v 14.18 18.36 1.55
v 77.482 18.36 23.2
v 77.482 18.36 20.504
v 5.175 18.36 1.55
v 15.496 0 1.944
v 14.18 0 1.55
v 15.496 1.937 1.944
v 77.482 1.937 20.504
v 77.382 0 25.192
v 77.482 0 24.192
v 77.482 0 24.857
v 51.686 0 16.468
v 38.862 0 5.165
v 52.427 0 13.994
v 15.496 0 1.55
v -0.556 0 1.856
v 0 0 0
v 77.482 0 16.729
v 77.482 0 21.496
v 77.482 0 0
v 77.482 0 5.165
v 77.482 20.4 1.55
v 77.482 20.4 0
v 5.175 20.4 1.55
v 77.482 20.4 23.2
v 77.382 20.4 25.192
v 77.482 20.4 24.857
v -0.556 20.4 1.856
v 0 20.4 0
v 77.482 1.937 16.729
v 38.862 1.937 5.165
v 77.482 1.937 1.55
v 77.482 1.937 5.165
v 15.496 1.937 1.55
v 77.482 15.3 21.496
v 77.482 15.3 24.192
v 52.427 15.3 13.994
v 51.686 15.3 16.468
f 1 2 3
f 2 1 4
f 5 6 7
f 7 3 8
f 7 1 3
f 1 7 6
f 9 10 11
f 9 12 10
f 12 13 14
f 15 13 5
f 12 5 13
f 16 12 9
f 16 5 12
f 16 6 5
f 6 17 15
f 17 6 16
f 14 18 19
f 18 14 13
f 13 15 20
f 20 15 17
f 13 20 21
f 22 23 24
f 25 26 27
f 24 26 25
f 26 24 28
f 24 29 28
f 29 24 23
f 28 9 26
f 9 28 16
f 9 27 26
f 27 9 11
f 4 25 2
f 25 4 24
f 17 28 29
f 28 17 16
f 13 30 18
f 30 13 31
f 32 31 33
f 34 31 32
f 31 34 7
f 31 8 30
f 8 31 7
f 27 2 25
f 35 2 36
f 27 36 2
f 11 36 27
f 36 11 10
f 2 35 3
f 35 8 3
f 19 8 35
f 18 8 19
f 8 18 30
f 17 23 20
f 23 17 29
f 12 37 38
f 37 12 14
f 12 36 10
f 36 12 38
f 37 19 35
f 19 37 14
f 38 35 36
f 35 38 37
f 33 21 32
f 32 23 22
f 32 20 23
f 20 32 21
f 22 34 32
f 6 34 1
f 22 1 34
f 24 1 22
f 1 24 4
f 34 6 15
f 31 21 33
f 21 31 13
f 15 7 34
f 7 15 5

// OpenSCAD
coldiameter = 17;
mod = coldiameter;					//this is the diameter of a column
cpo = mod/10; 						// capitol offset, to determine depth
depth = (mod + (cpo*2))* 1.0;  	//allows over or under hang if desired

//height = mod * 6;					//height of a column if you use this comment out the one below
ch = mod*5* 1.24;					//height of a column
//length = 90;
//width = (length * 7/6) * .618;  					//golden rectangle
//length = ch * .618;  								// for golden rectangle

n_o_c = 6;											//number of columns across front of temple
length = ((ch*1.618)*1.618)/(n_o_c-1); 		//comment either this or the other def out before compiling
echo ("Length",length);							//if used, front of temple is golden rectangle
p_overhang = mod;
p_width = (length * (n_o_c-1)) + + mod + p_overhang;	//overall width of pediment
echo("p_width=", p_width);
p_length = p_width/4;
echo("p_length=", p_length);

height = ch/15;

f_height = height*2;		  //frieze height
c_height = height *2/3;		  //cornice height
p_height = (ch * .618) - f_height - c_height;
echo("p_height", p_height);
angle = atan(p_height/(p_width/2));
top_angle = 180 - (angle*2);
echo("angle=",top_angle);
hl = p_length/cos(angle)*1.02;

pediment_end();
//pediment_middle();
//join_plates();

module pediment_end() {
	cube([p_length,depth,p_length/50]);												//base
	translate([p_length/5,0,0]) cube([p_length*.8,p_length/40,p_length/15]);	//back flange
	difference() {
		union() {
			rotate([0,-angle,0]) translate([0,0,-p_length/30])
				cube([hl,depth*.9,p_length/25]);										//lower top
			rotate([0,-angle,0])	translate([0,0,0]) 
				cube([p_length*1.05,depth,p_length/40]);							//upper top
						//top flange
			rotate([0,-angle,0])	translate([p_length/5,0,-p_length/12.5]) 
				cube([hl*.8,p_length/40,p_length/15]);								//top flange
		}
	translate([p_length,0,0]) cube([p_length/25,depth,p_length/2]);			//make far end vertical
	translate([0,0,-p_length/25]) cube([p_length,depth,p_length/25]);			//smooth bottom
	rotate([0,-angle,0])	translate([p_length*.7,0,-depth/12.5]) 					//slot 
		cube([p_length/2.5,depth*.75,p_length/30]);
	}
}


module pediment_middle() {
	cube([p_length,depth,p_length/50]);											//base
	cube([p_length,p_length/40,p_length/15]);										//back flange
	difference() {
		union() {
			rotate([0,-angle],0) translate([0,0,p_length/8])
				cube([hl*1.05,depth*.9,p_length/25]);								//lower top
			rotate([0,-angle,0])	translate([0,0,p_length/8+p_length/25]) 
				cube([hl*1.05,depth,p_length/40]);									//upper top
			rotate([0,-angle,0])	translate([0,0,p_length/15]) 
				cube([hl*1.05,p_length/40,p_length/15]);							//top flange
		}
	translate([p_length,0,0]) cube([p_length/12,depth,p_length/1.5]);			//make far end vertical
	translate([-p_length/12,0,0]) cube([p_length/12,depth,p_length/2]);		//make near end vertical
	//translate([0,0,-p_length/25]) cube([p_length,depth,p_length/25]);		//smooth bottom
	rotate([0,-angle,0])	translate([p_length*.0,0,depth/10+p_length/8.75])	//lower slot 
		cube([p_length/3,depth*.75,p_length/30]);
	rotate([0,-angle,0])	translate([hl*.7,0,depth/10+p_length/8.75])			//upper slot 
		cube([p_length/2.75,depth*.75,p_length/30]);
	}
}

module join_plates() {
	translate([-p_length/120,-p_length/40,0]) 
		cube([p_length/4,depth*.7,p_length/40]);							//center angle joiner right
	rotate([90,0,0]) translate([-p_length/100,-depth*.25,0])
		cube([p_length/4,depth*.25,p_length/40]);							//center angle joiner flange right
	
	rotate([0,top_angle,0]) translate([-p_length/120,-p_length/40,-p_length/40])	//center angle joiner left 
		cube([p_length/4,depth*.70,p_length/40]);
	rotate([90,top_angle,0]) translate([-p_length/100,0,0]) 					//center angle joiner flange left
		cube([p_length/4,depth*.25,p_length/40]);

	translate([0,-p_length/40,10]) 
		cube([p_length/4,depth*.25,p_length/40]);
	rotate([90,0,0]) translate([0,10,0]) 											//base plate
		cube([p_length/4,depth*.7,p_length/40]);

	translate([0,-p_length/40,depth*1.5]) 
		cube([p_length/4,depth*.25,p_length/40]);
	rotate([90,0,0]) translate([0,depth*1.5,0])  								//base plate #2
		cube([p_length/4,depth*.7,p_length/40]);
}
